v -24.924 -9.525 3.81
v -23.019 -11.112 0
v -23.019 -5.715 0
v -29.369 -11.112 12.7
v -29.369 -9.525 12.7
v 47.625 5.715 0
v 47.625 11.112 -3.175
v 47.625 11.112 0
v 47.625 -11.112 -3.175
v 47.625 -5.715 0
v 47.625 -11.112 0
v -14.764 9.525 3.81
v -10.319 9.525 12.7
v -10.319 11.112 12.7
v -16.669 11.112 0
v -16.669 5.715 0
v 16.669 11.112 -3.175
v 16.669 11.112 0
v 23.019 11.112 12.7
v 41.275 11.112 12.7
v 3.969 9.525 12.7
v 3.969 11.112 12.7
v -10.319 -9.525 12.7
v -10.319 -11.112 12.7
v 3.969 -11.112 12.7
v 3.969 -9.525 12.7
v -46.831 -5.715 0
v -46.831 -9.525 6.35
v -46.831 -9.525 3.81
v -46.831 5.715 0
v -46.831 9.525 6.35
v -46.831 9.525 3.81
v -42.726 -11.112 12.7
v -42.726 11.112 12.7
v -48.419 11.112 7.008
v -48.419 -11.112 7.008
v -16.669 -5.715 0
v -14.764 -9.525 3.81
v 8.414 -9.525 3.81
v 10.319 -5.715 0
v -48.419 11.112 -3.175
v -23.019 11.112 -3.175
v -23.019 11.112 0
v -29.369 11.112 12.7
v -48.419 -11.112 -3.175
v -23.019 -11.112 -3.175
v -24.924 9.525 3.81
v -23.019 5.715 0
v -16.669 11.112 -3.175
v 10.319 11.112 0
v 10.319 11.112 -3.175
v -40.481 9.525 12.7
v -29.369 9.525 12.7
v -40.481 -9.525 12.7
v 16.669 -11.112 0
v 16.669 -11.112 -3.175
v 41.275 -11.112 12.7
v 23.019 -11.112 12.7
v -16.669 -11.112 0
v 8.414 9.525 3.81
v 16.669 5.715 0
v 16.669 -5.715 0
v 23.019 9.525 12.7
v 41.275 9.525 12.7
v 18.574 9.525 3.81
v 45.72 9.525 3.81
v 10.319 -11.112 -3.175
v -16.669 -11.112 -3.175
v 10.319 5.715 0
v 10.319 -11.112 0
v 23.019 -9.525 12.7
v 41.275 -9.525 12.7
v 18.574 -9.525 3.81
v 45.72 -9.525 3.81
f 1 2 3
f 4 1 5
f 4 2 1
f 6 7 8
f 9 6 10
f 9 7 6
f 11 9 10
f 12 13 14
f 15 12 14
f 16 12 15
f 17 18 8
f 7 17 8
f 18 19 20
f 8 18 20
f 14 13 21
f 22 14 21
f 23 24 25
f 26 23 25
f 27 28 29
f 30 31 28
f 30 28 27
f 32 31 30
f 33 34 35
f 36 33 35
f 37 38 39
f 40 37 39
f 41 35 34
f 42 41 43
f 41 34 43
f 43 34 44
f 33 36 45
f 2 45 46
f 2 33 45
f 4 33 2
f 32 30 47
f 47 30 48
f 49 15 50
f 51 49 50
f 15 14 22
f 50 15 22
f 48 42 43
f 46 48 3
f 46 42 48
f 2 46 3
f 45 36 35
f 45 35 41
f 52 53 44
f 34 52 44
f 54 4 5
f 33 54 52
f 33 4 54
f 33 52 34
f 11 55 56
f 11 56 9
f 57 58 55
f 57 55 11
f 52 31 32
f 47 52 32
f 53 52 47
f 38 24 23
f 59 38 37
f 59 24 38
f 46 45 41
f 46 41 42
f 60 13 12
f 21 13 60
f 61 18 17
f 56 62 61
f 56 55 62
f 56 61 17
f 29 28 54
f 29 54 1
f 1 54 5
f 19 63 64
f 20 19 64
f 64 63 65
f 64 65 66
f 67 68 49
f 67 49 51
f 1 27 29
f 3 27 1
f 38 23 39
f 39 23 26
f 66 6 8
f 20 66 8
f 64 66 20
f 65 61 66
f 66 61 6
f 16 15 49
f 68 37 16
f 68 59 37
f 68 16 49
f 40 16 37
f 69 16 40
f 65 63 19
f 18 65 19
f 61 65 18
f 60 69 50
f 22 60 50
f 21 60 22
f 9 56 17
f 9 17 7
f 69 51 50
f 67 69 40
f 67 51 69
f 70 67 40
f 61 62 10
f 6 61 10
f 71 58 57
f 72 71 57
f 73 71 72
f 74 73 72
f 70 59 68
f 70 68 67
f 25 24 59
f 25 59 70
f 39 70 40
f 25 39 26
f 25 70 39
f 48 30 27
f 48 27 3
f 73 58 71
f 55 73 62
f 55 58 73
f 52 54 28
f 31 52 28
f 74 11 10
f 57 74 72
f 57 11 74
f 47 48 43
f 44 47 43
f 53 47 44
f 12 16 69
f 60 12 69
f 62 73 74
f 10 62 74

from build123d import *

# Parameters (mm, degrees)
F0_W      = 11.1125
F0_H      = 12.7
F1_DEPTH  = 11.1125
F0_W_2    = 14.2875
F0_W_3    = 18.25625
F2_DEPTH  = 9.525
F3_SIZE   = 3.81
F3_2_SIZE = 3.81
F3_3_SIZE = 3.81


# Not quite as in the source:
# - a feature names something its author has since deleted; it is built from what else it names


with BuildPart() as f1:
    # F0 (on Front) → F1 (new body, symmetric)
    with BuildSketch(Plane.XZ):
        Polygon((-46.83125, 0), (-40.48125, 0), (-40.48125, 12.7), (-46.83125, 6.35), align=None)
        Polygon((-29.36875, 0), (-23.01875, 0), (-29.36875, 12.7), align=None)
        Polygon((-48.41875, -3.175), (-46.83125, -3.175), (-46.83125, 0), (-46.83125, 6.35), (-40.48125, 12.7), (-42.7263140303, 12.7), (-48.41875, 7.0075640303), (-48.41875, 6.35), align=None)
        Polygon((-23.01875, -3.175), (-23.01875, 0), (-29.36875, 0), (-40.48125, 0), (-46.83125, 0), (-46.83125, -3.175), align=None)
        with Locations((-34.925, 6.35)):
            Rectangle(F0_W, F0_H)
    extrude(amount=F1_DEPTH, both=True)


with BuildPart() as f1b:
    # F0 (on Front) → F1, piece 2 (new body, symmetric)
    with BuildSketch(Plane.XZ):
        Polygon((-16.66875, 0), (-10.31875, 0), (-10.31875, 12.7), align=None)
        Polygon((3.96875, 0), (10.31875, 0), (3.96875, 12.7), align=None)
        Polygon((10.31875, -3.175), (10.31875, 0), (3.96875, 0), (-10.31875, 0), (-16.66875, 0), (-16.66875, -3.175), align=None)
        with Locations((-3.175, 6.35)):
            Rectangle(F0_W_2, F0_H)
    extrude(amount=F1_DEPTH, both=True)


with BuildPart() as f1c:
    # F0 (on Front) → F1, piece 3 (new body, symmetric)
    with BuildSketch(Plane.XZ):
        Polygon((23.01875, 12.7), (16.66875, 0), (23.01875, 0), align=None)
        Polygon((41.275, 0), (47.625, 0), (41.275, 12.7), align=None)
        Polygon((16.66875, 0), (16.66875, -3.175), (47.625, -3.175), (47.625, 0), (41.275, 0), (23.01875, 0), align=None)
        with Locations((32.146875, 6.35)):
            Rectangle(F0_W_3, F0_H)
    extrude(amount=F1_DEPTH, both=True)


with BuildPart() as f2_tool:
    # F0 (on Front) → F2 (new body, symmetric)
    with BuildSketch(Plane.XZ):
        Polygon((-46.83125, 0), (-40.48125, 0), (-40.48125, 12.7), (-46.83125, 6.35), align=None)
        with Locations((-34.925, 6.35)):
            Rectangle(F0_W, F0_H)
        Polygon((-29.36875, 0), (-23.01875, 0), (-29.36875, 12.7), align=None)
        with Locations((-3.175, 6.35)):
            Rectangle(F0_W_2, F0_H)
        Polygon((-16.66875, 0), (-10.31875, 0), (-10.31875, 12.7), align=None)
        Polygon((3.96875, 0), (10.31875, 0), (3.96875, 12.7), align=None)
        Polygon((23.01875, 12.7), (16.66875, 0), (23.01875, 0), align=None)
        with Locations((32.146875, 6.35)):
            Rectangle(F0_W_3, F0_H)
        Polygon((41.275, 0), (47.625, 0), (41.275, 12.7), align=None)
    extrude(amount=F2_DEPTH, both=True)


with BuildPart() as f1_1:
    add(f1.part)

    # F2: cut by f2_tool
    add(f2_tool.part, mode=Mode.SUBTRACT)

    # F3
    f3_edges = [f1_1.edges().sort_by_distance(p)[0] for p in [
        (-34.925, -9.525, 0),
        (-34.925, 9.525, 0),
    ]]
    chamfer(f3_edges, length=F3_SIZE)


with BuildPart() as f1b_1:
    add(f1b.part)

    # F2: cut by f2_tool
    add(f2_tool.part, mode=Mode.SUBTRACT)

    # F3#2
    f3_2_edges = [f1b_1.edges().sort_by_distance(p)[0] for p in [
        (-3.175, 9.525, 0),
        (-3.175, -9.525, 0),
    ]]
    chamfer(f3_2_edges, length=F3_2_SIZE)


with BuildPart() as f1c_1:
    add(f1c.part)

    # F2: cut by f2_tool
    add(f2_tool.part, mode=Mode.SUBTRACT)

    # F3#3
    f3_3_edges = [f1c_1.edges().sort_by_distance(p)[0] for p in [
        (32.146875, 9.525, 0),
        (32.146875, -9.525, 0),
    ]]
    chamfer(f3_3_edges, length=F3_3_SIZE)


solid = Compound([f1_1.part, f1b_1.part, f1c_1.part])
